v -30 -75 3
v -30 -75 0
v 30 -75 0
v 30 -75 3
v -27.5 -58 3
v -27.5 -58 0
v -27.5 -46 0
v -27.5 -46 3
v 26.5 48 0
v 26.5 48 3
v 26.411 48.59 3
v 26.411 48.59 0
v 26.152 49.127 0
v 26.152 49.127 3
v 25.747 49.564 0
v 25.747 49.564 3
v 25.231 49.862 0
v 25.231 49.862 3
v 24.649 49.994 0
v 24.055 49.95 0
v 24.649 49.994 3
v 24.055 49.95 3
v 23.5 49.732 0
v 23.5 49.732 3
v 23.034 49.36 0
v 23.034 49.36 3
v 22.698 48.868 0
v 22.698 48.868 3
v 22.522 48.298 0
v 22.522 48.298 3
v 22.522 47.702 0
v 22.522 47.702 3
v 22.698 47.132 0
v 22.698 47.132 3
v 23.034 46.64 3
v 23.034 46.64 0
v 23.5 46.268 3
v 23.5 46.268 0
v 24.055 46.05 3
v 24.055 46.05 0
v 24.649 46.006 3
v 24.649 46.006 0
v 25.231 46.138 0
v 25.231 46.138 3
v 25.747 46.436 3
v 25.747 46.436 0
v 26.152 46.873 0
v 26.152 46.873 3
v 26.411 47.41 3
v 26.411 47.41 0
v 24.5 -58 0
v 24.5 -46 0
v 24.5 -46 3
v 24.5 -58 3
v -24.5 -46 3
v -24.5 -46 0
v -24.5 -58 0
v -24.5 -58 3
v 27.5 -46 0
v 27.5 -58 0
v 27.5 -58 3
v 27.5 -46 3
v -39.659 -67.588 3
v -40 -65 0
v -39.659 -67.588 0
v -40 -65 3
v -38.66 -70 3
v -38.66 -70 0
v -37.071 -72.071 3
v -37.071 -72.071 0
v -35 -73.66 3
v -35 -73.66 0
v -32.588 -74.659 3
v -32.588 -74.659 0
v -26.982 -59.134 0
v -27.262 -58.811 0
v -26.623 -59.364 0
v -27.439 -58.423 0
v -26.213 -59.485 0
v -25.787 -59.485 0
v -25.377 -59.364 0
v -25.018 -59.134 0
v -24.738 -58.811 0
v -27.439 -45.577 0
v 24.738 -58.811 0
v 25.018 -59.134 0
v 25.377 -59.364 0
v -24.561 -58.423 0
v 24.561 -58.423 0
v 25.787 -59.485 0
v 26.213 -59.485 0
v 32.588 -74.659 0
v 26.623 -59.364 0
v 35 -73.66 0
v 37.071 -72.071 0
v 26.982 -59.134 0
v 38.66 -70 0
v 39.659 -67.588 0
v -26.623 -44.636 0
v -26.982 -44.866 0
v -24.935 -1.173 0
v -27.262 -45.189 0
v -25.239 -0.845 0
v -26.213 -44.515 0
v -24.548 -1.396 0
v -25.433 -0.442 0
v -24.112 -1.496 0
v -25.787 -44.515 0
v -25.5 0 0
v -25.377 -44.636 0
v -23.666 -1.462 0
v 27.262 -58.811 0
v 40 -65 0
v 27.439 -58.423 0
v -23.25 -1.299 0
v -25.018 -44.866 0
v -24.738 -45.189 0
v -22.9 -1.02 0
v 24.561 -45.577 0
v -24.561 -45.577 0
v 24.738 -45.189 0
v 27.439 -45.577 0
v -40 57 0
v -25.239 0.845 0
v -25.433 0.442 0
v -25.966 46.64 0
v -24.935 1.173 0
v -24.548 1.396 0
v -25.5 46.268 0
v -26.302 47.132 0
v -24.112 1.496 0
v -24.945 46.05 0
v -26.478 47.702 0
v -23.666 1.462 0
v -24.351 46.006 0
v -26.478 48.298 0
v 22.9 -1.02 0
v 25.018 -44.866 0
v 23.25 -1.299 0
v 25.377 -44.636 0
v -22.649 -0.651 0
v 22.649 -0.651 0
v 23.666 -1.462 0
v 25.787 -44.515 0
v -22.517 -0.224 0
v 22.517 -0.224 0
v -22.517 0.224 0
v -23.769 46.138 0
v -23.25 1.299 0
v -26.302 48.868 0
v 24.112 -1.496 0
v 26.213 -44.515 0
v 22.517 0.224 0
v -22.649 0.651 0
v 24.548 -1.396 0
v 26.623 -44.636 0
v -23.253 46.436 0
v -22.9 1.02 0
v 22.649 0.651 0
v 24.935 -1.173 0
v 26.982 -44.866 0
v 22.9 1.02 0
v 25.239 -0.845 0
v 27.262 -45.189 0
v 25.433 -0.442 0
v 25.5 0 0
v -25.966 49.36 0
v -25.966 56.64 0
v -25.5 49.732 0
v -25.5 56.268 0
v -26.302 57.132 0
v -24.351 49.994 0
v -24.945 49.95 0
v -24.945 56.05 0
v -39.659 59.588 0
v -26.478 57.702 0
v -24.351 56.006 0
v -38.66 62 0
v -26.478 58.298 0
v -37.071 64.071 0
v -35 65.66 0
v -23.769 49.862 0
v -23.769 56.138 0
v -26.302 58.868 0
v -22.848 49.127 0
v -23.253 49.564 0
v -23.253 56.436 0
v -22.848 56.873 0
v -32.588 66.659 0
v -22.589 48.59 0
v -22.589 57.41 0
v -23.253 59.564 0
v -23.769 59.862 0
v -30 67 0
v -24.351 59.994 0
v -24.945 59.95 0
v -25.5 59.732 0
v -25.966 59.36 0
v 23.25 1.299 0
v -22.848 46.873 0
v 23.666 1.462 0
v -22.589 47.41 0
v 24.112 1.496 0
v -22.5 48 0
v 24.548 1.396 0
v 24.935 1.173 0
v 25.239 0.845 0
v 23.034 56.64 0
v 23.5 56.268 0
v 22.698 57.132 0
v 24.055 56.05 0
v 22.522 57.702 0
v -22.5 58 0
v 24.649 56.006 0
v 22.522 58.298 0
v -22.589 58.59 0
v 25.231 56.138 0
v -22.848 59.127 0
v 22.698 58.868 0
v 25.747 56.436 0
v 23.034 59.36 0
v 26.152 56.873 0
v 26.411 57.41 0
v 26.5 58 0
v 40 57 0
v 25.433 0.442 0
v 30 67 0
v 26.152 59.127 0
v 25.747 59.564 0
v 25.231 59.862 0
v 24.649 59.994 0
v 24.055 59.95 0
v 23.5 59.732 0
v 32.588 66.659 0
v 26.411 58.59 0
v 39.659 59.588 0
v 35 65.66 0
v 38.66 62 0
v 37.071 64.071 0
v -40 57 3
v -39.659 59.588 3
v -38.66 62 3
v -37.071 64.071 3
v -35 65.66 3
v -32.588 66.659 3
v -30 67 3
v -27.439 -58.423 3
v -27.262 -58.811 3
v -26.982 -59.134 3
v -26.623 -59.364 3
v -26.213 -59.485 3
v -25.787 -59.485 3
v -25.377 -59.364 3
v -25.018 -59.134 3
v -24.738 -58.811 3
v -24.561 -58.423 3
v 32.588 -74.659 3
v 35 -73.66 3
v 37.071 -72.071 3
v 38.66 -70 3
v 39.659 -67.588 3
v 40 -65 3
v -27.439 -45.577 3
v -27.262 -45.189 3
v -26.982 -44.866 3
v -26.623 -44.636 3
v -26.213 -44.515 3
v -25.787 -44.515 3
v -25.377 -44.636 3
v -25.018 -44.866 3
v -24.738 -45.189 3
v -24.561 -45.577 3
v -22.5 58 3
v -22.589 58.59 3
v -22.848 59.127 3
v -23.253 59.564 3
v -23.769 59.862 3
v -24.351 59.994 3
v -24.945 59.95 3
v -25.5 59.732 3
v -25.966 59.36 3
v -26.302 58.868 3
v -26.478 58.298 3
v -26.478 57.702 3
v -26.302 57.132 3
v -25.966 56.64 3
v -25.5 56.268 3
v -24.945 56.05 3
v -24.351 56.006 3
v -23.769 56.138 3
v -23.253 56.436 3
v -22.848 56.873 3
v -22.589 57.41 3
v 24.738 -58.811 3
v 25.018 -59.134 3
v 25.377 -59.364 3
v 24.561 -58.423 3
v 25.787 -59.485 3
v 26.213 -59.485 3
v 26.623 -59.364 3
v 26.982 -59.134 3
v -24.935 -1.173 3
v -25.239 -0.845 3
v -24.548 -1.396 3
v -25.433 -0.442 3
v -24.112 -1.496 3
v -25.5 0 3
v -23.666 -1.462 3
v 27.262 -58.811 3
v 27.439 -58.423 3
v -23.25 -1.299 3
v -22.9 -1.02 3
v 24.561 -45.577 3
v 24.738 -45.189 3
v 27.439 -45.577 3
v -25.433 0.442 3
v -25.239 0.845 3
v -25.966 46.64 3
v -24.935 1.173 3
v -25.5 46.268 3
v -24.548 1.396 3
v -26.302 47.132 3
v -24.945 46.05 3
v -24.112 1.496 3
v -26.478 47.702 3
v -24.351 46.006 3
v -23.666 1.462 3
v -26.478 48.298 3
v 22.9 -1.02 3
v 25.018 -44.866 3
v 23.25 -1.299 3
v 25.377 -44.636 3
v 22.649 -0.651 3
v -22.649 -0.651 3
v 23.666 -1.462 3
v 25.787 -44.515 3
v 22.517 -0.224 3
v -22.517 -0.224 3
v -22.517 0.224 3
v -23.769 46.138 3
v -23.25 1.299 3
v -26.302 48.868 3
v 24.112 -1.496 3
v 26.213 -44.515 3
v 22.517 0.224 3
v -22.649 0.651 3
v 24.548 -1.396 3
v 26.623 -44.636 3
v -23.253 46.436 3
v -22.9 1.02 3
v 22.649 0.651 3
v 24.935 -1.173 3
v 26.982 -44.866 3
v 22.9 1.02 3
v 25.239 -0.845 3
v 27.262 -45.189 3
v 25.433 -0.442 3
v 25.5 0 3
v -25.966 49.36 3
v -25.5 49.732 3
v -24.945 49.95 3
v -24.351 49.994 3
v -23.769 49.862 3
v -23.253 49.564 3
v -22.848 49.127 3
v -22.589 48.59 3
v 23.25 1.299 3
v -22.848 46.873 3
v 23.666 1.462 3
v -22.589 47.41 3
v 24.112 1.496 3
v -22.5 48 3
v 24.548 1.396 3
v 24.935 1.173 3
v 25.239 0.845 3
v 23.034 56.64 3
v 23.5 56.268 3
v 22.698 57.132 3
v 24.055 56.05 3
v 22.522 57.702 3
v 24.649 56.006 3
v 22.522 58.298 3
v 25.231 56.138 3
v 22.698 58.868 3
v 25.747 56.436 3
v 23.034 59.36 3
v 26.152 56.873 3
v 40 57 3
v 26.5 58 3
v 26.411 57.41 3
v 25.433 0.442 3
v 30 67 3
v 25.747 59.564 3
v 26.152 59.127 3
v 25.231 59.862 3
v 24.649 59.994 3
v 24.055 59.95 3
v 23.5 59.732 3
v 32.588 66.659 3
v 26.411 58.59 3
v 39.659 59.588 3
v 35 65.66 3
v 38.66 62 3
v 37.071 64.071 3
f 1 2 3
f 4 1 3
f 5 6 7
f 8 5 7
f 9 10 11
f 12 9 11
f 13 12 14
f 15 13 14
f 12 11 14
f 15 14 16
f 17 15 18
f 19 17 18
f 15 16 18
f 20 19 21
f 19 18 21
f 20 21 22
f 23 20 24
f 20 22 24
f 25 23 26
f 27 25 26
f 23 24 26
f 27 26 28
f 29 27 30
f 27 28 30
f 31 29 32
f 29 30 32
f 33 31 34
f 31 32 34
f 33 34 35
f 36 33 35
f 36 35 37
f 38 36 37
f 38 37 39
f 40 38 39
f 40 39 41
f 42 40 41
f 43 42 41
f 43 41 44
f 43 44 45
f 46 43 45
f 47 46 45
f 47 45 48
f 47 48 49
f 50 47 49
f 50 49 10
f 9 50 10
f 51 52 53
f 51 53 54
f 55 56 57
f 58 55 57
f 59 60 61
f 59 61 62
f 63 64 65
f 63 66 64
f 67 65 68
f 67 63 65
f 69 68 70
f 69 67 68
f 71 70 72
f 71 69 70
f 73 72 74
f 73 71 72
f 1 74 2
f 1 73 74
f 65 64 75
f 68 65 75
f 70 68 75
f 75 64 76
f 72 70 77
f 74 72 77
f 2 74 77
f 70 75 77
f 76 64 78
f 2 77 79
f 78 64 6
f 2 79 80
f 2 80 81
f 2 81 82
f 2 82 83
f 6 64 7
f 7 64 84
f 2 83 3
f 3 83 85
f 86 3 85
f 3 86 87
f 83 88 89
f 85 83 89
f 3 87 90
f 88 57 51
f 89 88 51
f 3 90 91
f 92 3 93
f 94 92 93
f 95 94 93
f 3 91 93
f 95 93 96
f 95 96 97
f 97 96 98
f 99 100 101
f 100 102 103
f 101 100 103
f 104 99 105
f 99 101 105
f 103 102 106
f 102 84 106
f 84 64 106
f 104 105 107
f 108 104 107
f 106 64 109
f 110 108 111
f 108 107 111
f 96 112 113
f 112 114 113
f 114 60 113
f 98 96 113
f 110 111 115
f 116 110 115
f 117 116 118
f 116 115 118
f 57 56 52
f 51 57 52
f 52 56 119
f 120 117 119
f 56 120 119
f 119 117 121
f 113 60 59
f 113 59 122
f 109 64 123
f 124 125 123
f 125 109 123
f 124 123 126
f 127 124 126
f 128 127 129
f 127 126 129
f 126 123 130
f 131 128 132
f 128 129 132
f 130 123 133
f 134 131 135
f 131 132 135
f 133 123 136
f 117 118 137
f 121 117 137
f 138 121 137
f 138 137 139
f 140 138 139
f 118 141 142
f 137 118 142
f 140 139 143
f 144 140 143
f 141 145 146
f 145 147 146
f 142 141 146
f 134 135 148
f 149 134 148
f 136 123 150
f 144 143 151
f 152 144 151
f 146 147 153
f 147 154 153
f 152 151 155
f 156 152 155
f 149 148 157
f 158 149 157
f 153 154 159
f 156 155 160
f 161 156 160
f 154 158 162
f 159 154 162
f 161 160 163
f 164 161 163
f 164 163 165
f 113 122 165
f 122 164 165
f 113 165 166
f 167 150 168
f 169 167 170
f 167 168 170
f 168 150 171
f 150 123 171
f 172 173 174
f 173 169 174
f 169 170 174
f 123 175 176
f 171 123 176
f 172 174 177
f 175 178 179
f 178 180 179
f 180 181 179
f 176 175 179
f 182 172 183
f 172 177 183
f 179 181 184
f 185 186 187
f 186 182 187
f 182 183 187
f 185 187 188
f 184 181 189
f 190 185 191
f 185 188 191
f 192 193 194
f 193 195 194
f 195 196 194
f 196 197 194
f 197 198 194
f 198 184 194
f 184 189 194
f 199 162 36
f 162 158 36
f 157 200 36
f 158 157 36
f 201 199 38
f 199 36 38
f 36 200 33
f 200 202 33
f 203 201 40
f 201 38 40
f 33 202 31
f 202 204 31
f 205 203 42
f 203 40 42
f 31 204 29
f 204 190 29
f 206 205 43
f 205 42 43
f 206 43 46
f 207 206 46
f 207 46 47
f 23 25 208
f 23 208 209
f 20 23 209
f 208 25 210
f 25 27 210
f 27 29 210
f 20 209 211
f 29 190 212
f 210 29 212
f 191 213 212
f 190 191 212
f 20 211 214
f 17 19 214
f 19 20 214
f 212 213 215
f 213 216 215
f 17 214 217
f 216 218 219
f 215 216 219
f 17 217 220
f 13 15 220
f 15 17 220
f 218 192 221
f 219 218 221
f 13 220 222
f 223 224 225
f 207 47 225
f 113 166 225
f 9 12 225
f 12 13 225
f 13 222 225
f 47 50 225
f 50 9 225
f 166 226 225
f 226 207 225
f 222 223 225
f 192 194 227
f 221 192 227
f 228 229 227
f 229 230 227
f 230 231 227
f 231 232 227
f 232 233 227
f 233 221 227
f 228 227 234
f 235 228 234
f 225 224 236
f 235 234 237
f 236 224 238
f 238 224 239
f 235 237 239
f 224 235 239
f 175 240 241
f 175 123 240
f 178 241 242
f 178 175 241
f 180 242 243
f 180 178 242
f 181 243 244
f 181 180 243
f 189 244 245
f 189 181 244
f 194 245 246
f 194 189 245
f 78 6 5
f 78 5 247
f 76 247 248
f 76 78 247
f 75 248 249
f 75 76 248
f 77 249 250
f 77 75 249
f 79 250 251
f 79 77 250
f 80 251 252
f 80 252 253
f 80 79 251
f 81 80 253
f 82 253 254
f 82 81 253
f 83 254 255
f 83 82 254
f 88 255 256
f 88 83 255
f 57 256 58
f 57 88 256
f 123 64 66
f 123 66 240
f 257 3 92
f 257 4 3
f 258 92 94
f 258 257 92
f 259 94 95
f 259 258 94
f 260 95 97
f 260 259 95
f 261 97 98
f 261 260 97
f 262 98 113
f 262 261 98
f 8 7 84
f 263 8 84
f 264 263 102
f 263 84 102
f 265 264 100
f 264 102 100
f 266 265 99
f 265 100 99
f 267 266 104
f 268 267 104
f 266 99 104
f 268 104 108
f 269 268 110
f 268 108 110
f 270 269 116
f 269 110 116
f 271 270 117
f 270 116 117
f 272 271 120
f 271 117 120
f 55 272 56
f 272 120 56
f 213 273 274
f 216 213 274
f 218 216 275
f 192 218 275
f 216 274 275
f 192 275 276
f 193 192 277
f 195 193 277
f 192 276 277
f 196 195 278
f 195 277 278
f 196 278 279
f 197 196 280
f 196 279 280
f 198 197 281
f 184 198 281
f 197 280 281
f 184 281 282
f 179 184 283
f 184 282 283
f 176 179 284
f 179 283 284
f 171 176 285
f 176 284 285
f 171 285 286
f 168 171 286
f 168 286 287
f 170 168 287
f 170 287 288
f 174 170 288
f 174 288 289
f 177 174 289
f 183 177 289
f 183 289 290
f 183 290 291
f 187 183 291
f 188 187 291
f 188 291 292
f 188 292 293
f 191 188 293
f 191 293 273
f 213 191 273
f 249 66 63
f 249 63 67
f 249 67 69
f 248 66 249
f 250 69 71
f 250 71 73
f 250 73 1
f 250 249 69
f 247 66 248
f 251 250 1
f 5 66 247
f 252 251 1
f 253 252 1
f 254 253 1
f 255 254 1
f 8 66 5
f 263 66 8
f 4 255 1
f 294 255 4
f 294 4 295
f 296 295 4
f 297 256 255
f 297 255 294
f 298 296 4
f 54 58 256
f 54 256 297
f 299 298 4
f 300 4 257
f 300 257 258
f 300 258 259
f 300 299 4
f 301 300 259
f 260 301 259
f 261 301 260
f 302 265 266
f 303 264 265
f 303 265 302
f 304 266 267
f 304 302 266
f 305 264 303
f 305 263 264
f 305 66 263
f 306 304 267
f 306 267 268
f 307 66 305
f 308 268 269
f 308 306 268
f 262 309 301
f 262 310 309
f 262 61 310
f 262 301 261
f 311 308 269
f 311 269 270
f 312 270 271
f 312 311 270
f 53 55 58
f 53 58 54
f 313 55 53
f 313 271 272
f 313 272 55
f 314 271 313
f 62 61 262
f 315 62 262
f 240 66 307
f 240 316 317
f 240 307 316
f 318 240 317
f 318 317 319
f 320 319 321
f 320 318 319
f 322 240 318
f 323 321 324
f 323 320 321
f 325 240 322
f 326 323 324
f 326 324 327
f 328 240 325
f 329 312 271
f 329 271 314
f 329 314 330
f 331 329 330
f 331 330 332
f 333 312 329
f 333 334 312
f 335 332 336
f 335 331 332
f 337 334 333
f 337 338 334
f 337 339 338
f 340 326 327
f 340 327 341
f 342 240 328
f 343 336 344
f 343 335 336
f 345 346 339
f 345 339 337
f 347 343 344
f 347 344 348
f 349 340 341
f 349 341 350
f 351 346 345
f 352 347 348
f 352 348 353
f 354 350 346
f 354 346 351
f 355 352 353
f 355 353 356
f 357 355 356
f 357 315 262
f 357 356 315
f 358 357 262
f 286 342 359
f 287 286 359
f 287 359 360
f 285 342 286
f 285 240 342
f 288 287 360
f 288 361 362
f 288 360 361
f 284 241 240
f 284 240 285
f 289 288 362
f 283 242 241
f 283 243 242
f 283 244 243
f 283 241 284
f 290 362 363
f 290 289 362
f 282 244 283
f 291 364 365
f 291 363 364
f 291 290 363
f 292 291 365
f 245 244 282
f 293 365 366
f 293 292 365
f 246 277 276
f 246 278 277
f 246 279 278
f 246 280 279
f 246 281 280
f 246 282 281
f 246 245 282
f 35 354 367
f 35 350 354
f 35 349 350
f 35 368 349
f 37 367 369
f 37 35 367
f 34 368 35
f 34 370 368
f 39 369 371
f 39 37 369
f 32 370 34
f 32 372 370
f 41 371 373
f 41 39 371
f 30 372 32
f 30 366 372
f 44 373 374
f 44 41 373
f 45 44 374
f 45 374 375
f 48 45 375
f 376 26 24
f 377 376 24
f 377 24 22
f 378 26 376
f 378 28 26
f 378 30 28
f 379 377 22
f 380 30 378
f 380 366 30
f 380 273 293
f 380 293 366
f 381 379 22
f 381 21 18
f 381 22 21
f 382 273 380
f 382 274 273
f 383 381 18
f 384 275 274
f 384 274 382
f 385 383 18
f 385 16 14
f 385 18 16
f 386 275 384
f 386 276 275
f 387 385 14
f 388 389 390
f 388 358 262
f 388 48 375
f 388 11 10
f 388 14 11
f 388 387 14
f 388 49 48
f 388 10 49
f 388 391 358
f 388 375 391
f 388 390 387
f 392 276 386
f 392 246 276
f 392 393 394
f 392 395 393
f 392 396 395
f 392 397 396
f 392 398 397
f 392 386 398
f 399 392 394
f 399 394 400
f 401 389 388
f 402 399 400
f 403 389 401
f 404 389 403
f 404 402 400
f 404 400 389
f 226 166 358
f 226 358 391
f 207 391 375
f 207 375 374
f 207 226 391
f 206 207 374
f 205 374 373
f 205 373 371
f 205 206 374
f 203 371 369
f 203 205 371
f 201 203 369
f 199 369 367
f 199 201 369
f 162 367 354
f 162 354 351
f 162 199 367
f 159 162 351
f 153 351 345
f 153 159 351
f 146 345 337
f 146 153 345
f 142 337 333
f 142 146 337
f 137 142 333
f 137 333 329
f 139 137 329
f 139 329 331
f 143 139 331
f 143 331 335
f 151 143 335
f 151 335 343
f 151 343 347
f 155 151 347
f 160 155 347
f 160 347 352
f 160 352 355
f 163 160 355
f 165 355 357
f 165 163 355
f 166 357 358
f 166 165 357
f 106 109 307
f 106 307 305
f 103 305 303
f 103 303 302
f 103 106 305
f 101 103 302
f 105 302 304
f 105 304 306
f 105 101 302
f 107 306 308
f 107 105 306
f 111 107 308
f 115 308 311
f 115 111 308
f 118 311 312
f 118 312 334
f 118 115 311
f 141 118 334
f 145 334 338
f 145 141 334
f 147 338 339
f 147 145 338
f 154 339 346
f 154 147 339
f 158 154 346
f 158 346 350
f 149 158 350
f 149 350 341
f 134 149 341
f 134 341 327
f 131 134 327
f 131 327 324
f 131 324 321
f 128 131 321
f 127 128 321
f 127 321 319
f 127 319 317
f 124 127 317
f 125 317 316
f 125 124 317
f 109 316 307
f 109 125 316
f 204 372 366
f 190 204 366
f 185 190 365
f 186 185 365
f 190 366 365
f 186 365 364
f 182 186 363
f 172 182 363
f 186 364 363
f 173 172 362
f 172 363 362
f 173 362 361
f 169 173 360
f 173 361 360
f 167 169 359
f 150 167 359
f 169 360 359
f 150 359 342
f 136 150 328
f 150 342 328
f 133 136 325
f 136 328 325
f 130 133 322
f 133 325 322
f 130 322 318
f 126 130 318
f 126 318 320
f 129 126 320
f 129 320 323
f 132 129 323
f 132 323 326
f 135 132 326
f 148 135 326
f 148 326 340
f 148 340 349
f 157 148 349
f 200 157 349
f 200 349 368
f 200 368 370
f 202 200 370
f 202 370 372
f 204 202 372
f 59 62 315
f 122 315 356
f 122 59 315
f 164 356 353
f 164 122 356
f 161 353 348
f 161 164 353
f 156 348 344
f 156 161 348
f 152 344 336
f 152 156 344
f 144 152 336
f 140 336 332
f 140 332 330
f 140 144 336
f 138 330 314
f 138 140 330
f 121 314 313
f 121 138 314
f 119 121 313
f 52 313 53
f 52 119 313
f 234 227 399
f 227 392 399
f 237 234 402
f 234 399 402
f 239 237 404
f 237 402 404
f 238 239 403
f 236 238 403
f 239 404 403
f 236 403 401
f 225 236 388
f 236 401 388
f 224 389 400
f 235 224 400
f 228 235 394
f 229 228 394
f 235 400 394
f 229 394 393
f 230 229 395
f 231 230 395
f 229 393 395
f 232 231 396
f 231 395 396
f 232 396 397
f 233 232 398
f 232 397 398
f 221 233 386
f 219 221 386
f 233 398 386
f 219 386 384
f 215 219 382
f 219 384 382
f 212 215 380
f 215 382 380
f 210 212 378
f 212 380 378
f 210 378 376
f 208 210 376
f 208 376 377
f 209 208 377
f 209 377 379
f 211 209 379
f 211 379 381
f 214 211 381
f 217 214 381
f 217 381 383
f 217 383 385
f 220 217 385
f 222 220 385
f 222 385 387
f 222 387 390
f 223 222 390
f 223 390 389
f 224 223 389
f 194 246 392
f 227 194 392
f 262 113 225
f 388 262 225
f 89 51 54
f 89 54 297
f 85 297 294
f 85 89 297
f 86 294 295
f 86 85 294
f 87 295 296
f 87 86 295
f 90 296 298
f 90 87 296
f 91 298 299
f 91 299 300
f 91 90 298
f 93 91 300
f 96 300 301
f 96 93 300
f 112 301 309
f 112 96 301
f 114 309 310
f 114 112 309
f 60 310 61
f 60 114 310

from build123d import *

# Parameters (mm, degrees)
SKETCH_1_W          = 80
SKETCH_1_H          = 150
SKETCH_1_R          = 1.5
EXTRUDE_1_DEPTH     = 3
CUT_EXTRUDE_START   = -10
CUT_EXTRUDE_1_DEPTH = 10
SKETCH_3_R          = 2
CUT_EXTRUDE_2_DEPTH = 10
SKETCH_4_W          = 87.19
SKETCH_4_H          = 8
CUT_EXTRUDE_3_DEPTH = 10
FILLET_1_R          = 10


with BuildPart() as part:
    # 草图1 → 凸台-拉伸1 (new body)
    with BuildSketch(Plane.XY):
        Rectangle(SKETCH_1_W, SKETCH_1_H)
        with Locations((24, 0)):
            Circle(SKETCH_1_R, mode=Mode.SUBTRACT)
        with Locations(Location((-24, 0, 0), (0, 0, 180))):
            Circle(SKETCH_1_R, mode=Mode.SUBTRACT)
        with Locations((24.5, 48)):
            Circle(SKETCH_1_R, mode=Mode.SUBTRACT)
        with Locations((-24.5, 48)):
            Circle(SKETCH_1_R, mode=Mode.SUBTRACT)
        with Locations((26, -58)):
            Circle(SKETCH_1_R, mode=Mode.SUBTRACT)
        with Locations((-26, -58)):
            Circle(SKETCH_1_R, mode=Mode.SUBTRACT)
    extrude(amount=EXTRUDE_1_DEPTH)

    # 草图2 → 切除-拉伸1 (cut)
    with BuildSketch(Plane.XY.offset(3).offset(CUT_EXTRUDE_START)):
        with BuildLine():
            Line((-27.5, -58), (-27.5, -46))
            ThreePointArc((-27.5, -46), (-26, -44.5), (-24.5, -46))
            Line((-24.5, -46), (-24.5, -58))
            ThreePointArc((-24.5, -58), (-26, -59.5), (-27.5, -58))
        make_face()
        with BuildLine():
            Line((27.5, -58), (27.5, -46))
            ThreePointArc((27.5, -46), (26, -44.5), (24.5, -46))
            Line((24.5, -46), (24.5, -58))
            ThreePointArc((24.5, -58), (26, -59.5), (27.5, -58))
        make_face()
    extrude(amount=CUT_EXTRUDE_1_DEPTH, mode=Mode.SUBTRACT)

    # 草图3 → 切除-拉伸2 (cut)
    with BuildSketch(Plane.XY.offset(3)):
        with Locations((24.5, 58)):
            Circle(SKETCH_3_R)
        with Locations((24.5, 48)):
            Circle(SKETCH_3_R)
        with Locations((-24.5, 48)):
            Circle(SKETCH_3_R)
        with Locations((-24.5, 58)):
            Circle(SKETCH_3_R)
    extrude(amount=-CUT_EXTRUDE_2_DEPTH, mode=Mode.SUBTRACT)

    # 草图4 → 切除-拉伸3 (cut)
    with BuildSketch(Plane.XY.offset(3)):
        with Locations((3.595, 71)):
            Rectangle(SKETCH_4_W, SKETCH_4_H)
    extrude(amount=-CUT_EXTRUDE_3_DEPTH, mode=Mode.SUBTRACT)

    # 圆角1
    fillet_1_edges = [part.edges().sort_by_distance(p)[0] for p in [
        (-40, 67, 1.5),
        (40, 67, 1.5),
        (40, -75, 1.5),
        (-40, -75, 1.5),
    ]]
    fillet(fillet_1_edges, radius=FILLET_1_R)


solid = part.part
